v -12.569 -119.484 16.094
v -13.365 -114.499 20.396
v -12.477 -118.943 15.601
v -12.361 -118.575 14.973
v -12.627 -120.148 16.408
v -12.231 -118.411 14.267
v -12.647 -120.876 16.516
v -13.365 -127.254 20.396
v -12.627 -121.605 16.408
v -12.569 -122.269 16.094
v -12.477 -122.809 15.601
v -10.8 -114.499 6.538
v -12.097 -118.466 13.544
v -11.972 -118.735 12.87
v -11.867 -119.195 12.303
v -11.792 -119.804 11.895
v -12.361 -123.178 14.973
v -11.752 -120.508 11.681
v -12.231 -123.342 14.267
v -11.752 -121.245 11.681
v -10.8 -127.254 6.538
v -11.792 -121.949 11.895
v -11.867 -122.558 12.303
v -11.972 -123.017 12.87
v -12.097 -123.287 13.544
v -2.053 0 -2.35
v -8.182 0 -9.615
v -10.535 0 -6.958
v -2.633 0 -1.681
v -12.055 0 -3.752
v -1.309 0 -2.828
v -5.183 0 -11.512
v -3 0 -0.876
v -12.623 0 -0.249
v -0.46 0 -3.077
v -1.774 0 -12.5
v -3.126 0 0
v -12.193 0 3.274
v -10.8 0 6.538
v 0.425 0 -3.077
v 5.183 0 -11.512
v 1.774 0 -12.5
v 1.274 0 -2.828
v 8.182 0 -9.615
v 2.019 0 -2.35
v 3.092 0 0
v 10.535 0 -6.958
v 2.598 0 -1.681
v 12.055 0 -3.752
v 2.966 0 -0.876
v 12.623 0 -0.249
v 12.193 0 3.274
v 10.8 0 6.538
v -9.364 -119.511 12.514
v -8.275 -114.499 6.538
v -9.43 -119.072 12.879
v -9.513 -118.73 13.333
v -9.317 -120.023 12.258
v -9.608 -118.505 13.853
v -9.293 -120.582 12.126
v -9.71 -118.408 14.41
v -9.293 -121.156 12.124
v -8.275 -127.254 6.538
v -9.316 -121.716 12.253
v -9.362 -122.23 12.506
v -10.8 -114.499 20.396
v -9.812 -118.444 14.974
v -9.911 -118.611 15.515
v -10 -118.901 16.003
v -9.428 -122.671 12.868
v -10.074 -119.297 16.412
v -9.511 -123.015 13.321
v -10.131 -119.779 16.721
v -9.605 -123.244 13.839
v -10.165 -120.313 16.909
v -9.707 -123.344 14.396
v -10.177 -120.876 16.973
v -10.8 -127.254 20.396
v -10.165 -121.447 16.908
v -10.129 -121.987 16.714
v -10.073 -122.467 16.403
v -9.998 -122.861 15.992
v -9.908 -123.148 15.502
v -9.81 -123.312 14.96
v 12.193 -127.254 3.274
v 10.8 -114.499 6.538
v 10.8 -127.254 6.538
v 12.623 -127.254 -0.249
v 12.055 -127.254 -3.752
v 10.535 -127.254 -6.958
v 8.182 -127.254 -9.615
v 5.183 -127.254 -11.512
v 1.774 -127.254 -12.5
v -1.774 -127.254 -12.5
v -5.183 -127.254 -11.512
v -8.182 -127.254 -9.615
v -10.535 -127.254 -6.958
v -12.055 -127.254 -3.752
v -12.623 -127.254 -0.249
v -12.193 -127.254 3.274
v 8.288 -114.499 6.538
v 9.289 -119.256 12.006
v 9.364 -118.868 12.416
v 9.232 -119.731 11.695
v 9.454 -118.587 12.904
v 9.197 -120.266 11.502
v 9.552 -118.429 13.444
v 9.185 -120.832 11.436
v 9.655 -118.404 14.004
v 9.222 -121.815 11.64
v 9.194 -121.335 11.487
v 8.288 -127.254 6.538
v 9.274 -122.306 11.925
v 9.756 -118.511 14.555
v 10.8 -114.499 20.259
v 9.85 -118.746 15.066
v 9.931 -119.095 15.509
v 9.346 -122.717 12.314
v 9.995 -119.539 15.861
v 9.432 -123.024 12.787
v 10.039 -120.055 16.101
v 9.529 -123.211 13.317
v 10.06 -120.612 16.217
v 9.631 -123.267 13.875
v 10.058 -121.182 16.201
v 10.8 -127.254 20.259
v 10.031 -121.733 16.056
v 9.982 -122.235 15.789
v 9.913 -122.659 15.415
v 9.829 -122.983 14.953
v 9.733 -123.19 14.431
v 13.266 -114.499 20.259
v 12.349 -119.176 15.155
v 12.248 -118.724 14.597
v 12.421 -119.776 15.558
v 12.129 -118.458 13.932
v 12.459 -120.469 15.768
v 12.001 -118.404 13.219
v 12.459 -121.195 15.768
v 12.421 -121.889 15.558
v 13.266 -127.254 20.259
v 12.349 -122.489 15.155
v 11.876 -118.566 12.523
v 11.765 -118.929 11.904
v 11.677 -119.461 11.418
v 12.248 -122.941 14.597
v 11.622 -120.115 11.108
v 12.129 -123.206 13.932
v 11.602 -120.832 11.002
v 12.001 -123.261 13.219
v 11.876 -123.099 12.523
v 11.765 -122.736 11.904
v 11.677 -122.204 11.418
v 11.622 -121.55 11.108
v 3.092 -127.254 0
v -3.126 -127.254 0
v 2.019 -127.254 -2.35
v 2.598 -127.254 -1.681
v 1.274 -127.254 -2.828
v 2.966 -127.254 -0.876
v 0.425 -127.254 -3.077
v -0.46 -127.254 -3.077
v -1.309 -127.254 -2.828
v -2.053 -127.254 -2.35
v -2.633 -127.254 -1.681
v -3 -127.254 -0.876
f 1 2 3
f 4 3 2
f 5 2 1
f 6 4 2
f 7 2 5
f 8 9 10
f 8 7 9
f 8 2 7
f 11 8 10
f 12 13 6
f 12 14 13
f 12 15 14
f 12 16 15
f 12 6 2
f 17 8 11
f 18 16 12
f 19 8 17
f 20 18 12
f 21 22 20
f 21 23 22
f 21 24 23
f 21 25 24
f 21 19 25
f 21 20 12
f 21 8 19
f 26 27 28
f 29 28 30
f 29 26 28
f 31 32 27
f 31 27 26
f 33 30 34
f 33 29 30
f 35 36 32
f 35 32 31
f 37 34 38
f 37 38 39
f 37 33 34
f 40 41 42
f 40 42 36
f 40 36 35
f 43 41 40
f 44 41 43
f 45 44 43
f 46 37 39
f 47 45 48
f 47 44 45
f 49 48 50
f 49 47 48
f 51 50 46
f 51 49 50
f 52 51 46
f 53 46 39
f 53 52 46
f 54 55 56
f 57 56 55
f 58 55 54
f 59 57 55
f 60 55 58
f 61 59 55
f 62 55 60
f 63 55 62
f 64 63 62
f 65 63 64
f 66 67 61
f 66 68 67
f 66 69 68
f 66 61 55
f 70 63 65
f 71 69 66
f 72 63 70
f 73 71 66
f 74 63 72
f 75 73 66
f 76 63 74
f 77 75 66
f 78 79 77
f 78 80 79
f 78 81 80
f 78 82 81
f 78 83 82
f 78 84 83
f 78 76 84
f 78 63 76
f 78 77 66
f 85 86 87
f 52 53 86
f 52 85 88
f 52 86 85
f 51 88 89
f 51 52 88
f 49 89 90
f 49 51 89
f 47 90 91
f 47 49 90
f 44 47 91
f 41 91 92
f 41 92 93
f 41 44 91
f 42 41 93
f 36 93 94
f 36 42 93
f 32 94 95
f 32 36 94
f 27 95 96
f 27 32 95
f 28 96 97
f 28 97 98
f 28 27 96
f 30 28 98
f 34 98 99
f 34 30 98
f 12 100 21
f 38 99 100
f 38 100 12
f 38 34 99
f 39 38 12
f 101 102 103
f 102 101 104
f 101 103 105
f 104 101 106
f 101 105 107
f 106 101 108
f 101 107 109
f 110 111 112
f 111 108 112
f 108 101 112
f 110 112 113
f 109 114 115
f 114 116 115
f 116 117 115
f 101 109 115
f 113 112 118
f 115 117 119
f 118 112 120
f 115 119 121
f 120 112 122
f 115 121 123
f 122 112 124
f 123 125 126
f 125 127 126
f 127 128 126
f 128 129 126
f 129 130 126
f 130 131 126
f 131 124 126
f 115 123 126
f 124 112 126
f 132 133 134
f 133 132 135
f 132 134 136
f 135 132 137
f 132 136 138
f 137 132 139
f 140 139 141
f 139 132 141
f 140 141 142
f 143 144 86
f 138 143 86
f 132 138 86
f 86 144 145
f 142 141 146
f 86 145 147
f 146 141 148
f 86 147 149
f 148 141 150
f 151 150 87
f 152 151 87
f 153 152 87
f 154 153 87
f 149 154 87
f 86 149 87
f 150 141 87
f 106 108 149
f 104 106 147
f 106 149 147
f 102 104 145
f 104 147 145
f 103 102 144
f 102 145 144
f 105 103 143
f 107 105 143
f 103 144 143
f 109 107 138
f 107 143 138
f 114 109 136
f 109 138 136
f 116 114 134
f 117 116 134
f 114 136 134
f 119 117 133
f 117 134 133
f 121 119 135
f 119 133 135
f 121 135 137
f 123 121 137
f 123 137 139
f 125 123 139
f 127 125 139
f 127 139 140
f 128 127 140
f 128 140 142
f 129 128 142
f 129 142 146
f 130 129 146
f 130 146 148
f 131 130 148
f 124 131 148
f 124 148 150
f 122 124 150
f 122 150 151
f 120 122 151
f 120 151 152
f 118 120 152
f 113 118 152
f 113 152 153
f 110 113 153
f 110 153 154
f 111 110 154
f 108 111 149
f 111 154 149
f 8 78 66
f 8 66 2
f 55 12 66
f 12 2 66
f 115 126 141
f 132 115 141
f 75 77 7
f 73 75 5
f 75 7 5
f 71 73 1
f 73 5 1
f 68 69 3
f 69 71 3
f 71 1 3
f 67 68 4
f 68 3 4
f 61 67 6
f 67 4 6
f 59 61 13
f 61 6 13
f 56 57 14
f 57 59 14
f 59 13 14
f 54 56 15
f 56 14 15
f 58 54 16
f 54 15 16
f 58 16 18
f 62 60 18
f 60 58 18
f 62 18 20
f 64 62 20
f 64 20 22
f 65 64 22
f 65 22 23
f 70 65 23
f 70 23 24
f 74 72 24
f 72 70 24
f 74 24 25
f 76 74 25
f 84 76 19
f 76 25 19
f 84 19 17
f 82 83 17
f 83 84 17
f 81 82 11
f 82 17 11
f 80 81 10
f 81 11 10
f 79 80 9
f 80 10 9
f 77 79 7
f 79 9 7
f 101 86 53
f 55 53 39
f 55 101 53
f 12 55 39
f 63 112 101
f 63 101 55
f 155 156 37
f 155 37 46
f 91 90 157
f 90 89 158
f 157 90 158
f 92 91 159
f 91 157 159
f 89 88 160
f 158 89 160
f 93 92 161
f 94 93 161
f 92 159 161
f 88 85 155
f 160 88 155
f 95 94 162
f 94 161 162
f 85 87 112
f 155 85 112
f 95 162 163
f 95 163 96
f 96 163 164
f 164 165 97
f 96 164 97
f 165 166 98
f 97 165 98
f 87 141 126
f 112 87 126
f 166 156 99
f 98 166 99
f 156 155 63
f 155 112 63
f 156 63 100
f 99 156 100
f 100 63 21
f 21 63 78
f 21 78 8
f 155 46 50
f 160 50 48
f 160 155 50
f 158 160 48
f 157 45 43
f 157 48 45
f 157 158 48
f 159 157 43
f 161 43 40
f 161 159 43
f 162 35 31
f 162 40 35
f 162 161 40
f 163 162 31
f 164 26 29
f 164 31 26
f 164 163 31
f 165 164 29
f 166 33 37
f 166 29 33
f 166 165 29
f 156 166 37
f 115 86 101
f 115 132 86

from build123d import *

# Parameters (mm, degrees)
SKETCH1_R           = 12.62515314
BOSS_EXTRUDE1_DEPTH = 127.254
SKETCH2_W           = 21.600890372
SKETCH2_H           = 6.08719661
CUT_EXTRUDE1_DEPTH  = 155.702
CUT_EXTRUDE2_DEPTH  = 141.081655767
BOSS_EXTRUDE2_DEPTH = 12.755190121
BOSS_EXTRUDE3_DEPTH = 12.755190121
SKETCH6_R           = 2.435016118
CUT_EXTRUDE3_DEPTH  = 11.231190121
SKETCH7_R           = 2.472305811
CUT_EXTRUDE4_DEPTH  = 10.977190121


with BuildPart() as part:
    # Sketch1 → Boss-Extrude1 (new body)
    with BuildSketch(Plane(origin=(0, 0, 0), x_dir=(1, 0, 0), z_dir=(0, 1, 0))):
        with Locations(Location((0, 0, 0), (0, 0, 270))):
            Circle(SKETCH1_R)
    extrude(amount=-BOSS_EXTRUDE1_DEPTH)

    # Sketch2 → Cut-Extrude1 (cut)
    with BuildSketch(Plane(origin=(0, -127.254, 0), x_dir=(-1, 0, 0), z_dir=(0, -1, 0))):
        with Locations((0, -9.581554835)):
            Rectangle(SKETCH2_W, SKETCH2_H)
    extrude(amount=-CUT_EXTRUDE1_DEPTH, mode=Mode.SUBTRACT)

    # Sketch3 → Cut-Extrude2 (cut)
    with BuildSketch(Plane(origin=(0, -127.254, 0), x_dir=(-1, 0, 0), z_dir=(0, -1, 0))):
        with BuildLine():
            Line((3.126169088, 0), (-3.091625783, 0))
            ThreePointArc((-3.091625783, 0), (0.017271652, 3.108897435), (3.126169088, 0))
        make_face()
    extrude(amount=-CUT_EXTRUDE2_DEPTH, mode=Mode.SUBTRACT)

    # Sketch4 → Boss-Extrude2 (add)
    with BuildSketch(Plane.XZ.offset(127.254)):
        Polygon((-10.800445186, 6.53795653), (-8.274777075, 6.53795653), (-10.800445186, 20.396051451), (-13.364649969, 20.396051451), align=None)
    extrude(amount=-BOSS_EXTRUDE2_DEPTH)

    # Sketch5 → Boss-Extrude3 (add)
    with BuildSketch(Plane.XZ.offset(127.254)):
        Polygon((10.800445186, 6.53795653), (8.287884941, 6.53795653), (10.800445186, 20.258509361), (13.265579683, 20.258509361), align=None)
    extrude(amount=-BOSS_EXTRUDE3_DEPTH)

    # Sketch6 → Cut-Extrude3 (cut)
    with BuildSketch(Plane(origin=(9.324781226, 0, -1.67535814), x_dir=(-0.17683579611178707, 0, -0.9842403676000647), z_dir=(0.9842403676000648, 0, -0.17683579611178707))):
        with Locations((-15.314949053, -120.83230441)):
            Circle(SKETCH6_R)
    extrude(amount=-CUT_EXTRUDE3_DEPTH, mode=Mode.SUBTRACT)

    # Sketch7 → Cut-Extrude4 (cut)
    with BuildSketch(Plane(origin=(-9.273218408, 0, -1.715851358), x_dir=(-0.18194456837394912, 0, 0.9833087887531655), z_dir=(-0.9833087887531655, 0, -0.18194456837394912))):
        with Locations((16.069302572, -120.876404939)):
            Circle(SKETCH7_R)
    extrude(amount=-CUT_EXTRUDE4_DEPTH, mode=Mode.SUBTRACT)


solid = part.part
